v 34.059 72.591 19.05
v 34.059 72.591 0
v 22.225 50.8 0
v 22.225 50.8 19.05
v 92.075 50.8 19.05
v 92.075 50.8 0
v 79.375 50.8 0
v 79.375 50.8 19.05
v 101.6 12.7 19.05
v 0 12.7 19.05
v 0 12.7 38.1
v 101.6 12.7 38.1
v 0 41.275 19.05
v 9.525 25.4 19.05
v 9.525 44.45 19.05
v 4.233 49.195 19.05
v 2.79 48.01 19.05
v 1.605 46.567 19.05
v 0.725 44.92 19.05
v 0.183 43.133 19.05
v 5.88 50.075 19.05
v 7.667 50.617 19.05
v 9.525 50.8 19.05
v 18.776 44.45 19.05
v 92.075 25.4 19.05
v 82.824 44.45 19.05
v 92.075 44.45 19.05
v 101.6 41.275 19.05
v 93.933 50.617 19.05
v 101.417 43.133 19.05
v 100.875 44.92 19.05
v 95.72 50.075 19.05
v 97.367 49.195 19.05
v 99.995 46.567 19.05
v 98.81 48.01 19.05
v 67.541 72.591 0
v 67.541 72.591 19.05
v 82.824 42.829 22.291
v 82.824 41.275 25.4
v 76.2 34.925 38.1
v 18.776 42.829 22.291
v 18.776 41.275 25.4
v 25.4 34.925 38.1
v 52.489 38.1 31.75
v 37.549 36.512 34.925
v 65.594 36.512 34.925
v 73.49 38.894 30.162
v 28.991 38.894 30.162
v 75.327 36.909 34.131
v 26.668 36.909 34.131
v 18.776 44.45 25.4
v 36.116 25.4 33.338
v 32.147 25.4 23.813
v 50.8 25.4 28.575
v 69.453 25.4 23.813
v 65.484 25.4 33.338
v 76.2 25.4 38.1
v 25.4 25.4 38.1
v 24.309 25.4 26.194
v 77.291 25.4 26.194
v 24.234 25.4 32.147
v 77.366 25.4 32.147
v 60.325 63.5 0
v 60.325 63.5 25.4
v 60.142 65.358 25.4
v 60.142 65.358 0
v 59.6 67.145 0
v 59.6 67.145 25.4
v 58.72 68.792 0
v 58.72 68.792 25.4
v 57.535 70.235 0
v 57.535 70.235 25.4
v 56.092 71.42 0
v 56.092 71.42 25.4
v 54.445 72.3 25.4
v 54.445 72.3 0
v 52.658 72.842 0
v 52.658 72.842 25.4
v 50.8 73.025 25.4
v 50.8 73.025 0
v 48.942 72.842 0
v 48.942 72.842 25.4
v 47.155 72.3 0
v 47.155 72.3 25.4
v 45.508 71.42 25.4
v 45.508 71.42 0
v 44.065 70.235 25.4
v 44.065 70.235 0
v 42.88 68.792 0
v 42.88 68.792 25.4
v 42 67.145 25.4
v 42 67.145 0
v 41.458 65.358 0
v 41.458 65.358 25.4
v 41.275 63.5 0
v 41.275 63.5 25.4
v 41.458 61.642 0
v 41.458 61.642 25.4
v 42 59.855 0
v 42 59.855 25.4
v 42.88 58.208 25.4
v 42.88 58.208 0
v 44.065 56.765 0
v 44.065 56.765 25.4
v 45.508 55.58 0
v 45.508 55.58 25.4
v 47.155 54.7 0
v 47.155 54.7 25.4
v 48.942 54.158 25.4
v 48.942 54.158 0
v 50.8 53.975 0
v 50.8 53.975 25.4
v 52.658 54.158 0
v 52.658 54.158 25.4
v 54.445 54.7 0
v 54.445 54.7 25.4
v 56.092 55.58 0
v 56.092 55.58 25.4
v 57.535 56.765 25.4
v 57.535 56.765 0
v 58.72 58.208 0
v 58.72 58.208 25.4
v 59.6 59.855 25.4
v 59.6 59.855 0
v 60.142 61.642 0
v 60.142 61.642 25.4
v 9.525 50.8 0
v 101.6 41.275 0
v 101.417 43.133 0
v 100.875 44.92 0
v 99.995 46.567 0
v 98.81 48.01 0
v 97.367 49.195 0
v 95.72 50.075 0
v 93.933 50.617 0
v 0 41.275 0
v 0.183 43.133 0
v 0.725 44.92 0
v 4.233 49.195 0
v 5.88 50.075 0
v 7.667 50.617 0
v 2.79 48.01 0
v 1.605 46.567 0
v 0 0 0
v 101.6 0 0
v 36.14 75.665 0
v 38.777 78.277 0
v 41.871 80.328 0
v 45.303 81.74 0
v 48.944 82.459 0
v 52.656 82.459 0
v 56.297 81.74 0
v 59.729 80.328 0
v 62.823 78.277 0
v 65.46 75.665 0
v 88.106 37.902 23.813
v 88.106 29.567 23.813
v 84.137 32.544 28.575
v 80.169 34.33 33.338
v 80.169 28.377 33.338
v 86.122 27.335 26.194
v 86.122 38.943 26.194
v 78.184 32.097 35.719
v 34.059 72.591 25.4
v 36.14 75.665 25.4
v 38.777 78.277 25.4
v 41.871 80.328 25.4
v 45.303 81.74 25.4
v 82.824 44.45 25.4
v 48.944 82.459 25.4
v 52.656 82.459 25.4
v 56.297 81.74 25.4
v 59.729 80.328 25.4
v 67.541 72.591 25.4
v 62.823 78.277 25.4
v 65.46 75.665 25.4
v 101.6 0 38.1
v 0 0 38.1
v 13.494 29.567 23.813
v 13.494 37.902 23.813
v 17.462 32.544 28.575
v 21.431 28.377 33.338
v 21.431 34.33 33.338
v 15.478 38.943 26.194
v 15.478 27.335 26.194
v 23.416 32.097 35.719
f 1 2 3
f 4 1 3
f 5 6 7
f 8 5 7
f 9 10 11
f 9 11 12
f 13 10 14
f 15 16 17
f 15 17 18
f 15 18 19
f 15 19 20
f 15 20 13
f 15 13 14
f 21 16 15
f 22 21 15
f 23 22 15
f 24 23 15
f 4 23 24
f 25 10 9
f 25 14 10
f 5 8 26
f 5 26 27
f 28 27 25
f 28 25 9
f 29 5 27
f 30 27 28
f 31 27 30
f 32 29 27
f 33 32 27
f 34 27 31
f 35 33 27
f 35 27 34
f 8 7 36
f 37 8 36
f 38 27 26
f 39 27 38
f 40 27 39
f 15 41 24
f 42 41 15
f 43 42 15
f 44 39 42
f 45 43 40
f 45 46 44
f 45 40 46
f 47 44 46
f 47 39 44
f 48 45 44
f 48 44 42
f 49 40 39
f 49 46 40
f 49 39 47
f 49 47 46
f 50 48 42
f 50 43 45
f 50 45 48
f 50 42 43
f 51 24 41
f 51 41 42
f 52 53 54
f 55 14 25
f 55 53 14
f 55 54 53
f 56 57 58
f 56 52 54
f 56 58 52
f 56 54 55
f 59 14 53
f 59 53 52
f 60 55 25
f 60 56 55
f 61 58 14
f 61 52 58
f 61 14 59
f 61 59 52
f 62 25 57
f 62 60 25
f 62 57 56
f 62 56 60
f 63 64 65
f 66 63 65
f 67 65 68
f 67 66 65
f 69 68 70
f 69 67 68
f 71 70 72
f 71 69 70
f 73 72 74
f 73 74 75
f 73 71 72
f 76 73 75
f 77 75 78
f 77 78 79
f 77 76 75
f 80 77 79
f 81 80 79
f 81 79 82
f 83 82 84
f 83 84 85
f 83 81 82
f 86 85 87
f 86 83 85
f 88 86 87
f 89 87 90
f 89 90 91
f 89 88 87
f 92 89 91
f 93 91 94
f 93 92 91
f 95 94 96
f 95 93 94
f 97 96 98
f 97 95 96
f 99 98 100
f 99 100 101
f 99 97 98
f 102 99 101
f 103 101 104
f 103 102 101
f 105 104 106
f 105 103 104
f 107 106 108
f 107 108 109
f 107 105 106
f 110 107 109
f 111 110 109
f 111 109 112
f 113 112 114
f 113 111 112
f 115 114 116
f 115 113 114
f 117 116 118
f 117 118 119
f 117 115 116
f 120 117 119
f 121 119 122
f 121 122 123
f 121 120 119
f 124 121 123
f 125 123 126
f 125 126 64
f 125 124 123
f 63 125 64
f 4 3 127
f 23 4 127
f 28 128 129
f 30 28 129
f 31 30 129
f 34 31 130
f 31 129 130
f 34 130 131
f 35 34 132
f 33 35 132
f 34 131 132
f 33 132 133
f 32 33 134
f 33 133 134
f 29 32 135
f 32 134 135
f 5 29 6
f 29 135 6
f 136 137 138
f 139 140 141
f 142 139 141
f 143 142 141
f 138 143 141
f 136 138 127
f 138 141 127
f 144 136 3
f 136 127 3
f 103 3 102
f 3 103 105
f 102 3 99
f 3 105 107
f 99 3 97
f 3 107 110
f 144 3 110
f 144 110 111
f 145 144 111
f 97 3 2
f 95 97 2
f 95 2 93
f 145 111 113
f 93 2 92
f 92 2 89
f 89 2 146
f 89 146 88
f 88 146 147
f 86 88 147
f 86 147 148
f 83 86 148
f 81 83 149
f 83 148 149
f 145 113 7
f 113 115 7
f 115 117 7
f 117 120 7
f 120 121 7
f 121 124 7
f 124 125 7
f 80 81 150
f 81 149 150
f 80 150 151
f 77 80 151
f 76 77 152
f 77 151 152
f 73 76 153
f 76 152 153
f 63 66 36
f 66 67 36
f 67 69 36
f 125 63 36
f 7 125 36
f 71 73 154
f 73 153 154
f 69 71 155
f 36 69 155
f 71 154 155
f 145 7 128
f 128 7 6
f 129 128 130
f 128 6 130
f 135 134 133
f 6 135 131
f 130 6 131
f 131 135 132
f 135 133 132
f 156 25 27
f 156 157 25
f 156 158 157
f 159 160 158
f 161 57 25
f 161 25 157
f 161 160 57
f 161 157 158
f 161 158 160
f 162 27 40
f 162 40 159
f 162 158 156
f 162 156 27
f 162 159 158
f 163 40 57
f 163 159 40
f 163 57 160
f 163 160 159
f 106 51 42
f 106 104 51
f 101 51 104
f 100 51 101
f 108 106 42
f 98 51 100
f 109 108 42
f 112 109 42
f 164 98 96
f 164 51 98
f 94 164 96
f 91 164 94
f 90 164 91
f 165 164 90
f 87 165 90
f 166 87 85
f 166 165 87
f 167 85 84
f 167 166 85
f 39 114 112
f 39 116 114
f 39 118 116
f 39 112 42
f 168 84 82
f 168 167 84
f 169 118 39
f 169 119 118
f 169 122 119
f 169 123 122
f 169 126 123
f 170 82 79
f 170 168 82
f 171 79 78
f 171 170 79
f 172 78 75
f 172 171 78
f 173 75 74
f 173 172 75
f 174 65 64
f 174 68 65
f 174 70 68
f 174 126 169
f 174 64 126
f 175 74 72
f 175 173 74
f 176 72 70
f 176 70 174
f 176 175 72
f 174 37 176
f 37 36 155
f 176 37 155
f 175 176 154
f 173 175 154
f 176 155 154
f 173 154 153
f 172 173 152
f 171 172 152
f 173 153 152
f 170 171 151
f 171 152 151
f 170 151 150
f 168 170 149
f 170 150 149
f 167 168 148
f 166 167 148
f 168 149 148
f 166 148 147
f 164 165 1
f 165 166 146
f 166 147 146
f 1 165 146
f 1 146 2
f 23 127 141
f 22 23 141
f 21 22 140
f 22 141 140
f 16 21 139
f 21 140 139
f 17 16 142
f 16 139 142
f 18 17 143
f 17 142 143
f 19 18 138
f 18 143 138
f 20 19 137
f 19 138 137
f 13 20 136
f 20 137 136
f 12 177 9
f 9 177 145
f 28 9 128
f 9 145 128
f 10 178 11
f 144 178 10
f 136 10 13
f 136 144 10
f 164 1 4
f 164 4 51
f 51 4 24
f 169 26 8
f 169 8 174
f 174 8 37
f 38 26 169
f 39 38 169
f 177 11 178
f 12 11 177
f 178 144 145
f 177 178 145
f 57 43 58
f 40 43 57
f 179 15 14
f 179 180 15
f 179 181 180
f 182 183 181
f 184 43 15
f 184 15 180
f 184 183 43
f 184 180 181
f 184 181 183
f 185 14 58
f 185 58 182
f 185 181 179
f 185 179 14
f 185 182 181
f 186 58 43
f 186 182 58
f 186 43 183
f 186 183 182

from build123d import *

# Parameters (mm, degrees)
SKETCH1_R           = 9.525
BOSS_EXTRUDE1_DEPTH = 19.05
SKETCH1_3_W         = 101.6
SKETCH1_3_H         = 12.7
BOSS_EXTRUDE2_DEPTH = 38.1
SKETCH6_R           = 9.525
BOSS_EXTRUDE6_DEPTH = 6.35
BOSS_EXTRUDE7_REACH = 119.26
SKETCH7_W           = 64.047051266
SKETCH7_H           = 6.35


with BuildPart() as part:
    # Sketch1 → Boss-Extrude1 (new body)
    with BuildSketch(Plane.XY):
        with BuildLine():
            Line((0, 41.275), (0, 12.7))
            Line((0, 12.7), (101.6, 12.7))
            Line((101.6, 12.7), (101.6, 41.275))
            ThreePointArc((101.6, 41.275), (98.810192091, 48.010192091), (92.075, 50.8))
            Line((92.075, 50.8), (79.375, 50.8))
            Line((79.375, 50.8), (67.540629127, 72.591415535))
            ThreePointArc((67.540629127, 72.591415535), (50.8, 82.55), (34.059370873, 72.591415535))
            Line((34.059370873, 72.591415535), (22.225, 50.8))
            Line((22.225, 50.8), (9.525, 50.8))
            ThreePointArc((9.525, 50.8), (2.789807909, 48.010192091), (0, 41.275))
        make_face()
        with Locations((50.8, 63.5)):
            Circle(SKETCH1_R, mode=Mode.SUBTRACT)
    extrude(amount=BOSS_EXTRUDE1_DEPTH)

    # Sketch1<3> → Boss-Extrude2 (add)
    with BuildSketch(Plane.XY):
        with Locations((50.8, 6.35)):
            Rectangle(SKETCH1_3_W, SKETCH1_3_H)
    extrude(amount=BOSS_EXTRUDE2_DEPTH)

    # Sketch5 → Loft1 section 0
    with BuildSketch(Plane.XY.offset(19.05)):
        with BuildLine():
            Line((9.525, 25.4), (92.075, 25.4))
            Line((92.075, 25.4), (92.075, 44.45))
            Line((92.075, 44.45), (9.525, 44.45))
            Line((9.525, 44.45), (9.525, 25.4))
        make_face()
    # Sketch2 → Loft1 section 1
    with BuildSketch(Plane.XY.offset(38.1)):
        with BuildLine():
            Line((25.4, 25.4), (76.2, 25.4))
            Line((76.2, 25.4), (76.2, 34.925))
            Line((76.2, 34.925), (25.4, 34.925))
            Line((25.4, 34.925), (25.4, 25.4))
        make_face()
    loft()

    # Sketch6 → Boss-Extrude6 (add)
    with BuildSketch(Plane.XY.offset(19.05)):
        with BuildLine():
            Line((34.059370873, 72.591415535), (18.776474367, 44.45))
            Line((18.776474367, 44.45), (82.823525633, 44.45))
            Line((82.823525633, 44.45), (67.540629127, 72.591415535))
            ThreePointArc((67.540629127, 72.591415535), (50.8, 82.55), (34.059370873, 72.591415535))
        make_face()
        with Locations((50.8, 63.5)):
            Circle(SKETCH6_R, mode=Mode.SUBTRACT)
    extrude(amount=BOSS_EXTRUDE6_DEPTH)

    # Sketch7 → Boss-Extrude7 (add, up to next)
    with BuildSketch(Plane.XZ.offset(-44.45), mode=Mode.PRIVATE) as boss_extrude7_sk1:
        with Locations((50.8, 22.225)):
            Rectangle(SKETCH7_W, SKETCH7_H)
    boss_extrude7_tool1 = extrude(boss_extrude7_sk1.sketch, amount=BOSS_EXTRUDE7_REACH, mode=Mode.PRIVATE) - part.part
    add(boss_extrude7_tool1.solids().sort_by_distance((50.8, 44.45, 22.225))[0])


solid = part.part
